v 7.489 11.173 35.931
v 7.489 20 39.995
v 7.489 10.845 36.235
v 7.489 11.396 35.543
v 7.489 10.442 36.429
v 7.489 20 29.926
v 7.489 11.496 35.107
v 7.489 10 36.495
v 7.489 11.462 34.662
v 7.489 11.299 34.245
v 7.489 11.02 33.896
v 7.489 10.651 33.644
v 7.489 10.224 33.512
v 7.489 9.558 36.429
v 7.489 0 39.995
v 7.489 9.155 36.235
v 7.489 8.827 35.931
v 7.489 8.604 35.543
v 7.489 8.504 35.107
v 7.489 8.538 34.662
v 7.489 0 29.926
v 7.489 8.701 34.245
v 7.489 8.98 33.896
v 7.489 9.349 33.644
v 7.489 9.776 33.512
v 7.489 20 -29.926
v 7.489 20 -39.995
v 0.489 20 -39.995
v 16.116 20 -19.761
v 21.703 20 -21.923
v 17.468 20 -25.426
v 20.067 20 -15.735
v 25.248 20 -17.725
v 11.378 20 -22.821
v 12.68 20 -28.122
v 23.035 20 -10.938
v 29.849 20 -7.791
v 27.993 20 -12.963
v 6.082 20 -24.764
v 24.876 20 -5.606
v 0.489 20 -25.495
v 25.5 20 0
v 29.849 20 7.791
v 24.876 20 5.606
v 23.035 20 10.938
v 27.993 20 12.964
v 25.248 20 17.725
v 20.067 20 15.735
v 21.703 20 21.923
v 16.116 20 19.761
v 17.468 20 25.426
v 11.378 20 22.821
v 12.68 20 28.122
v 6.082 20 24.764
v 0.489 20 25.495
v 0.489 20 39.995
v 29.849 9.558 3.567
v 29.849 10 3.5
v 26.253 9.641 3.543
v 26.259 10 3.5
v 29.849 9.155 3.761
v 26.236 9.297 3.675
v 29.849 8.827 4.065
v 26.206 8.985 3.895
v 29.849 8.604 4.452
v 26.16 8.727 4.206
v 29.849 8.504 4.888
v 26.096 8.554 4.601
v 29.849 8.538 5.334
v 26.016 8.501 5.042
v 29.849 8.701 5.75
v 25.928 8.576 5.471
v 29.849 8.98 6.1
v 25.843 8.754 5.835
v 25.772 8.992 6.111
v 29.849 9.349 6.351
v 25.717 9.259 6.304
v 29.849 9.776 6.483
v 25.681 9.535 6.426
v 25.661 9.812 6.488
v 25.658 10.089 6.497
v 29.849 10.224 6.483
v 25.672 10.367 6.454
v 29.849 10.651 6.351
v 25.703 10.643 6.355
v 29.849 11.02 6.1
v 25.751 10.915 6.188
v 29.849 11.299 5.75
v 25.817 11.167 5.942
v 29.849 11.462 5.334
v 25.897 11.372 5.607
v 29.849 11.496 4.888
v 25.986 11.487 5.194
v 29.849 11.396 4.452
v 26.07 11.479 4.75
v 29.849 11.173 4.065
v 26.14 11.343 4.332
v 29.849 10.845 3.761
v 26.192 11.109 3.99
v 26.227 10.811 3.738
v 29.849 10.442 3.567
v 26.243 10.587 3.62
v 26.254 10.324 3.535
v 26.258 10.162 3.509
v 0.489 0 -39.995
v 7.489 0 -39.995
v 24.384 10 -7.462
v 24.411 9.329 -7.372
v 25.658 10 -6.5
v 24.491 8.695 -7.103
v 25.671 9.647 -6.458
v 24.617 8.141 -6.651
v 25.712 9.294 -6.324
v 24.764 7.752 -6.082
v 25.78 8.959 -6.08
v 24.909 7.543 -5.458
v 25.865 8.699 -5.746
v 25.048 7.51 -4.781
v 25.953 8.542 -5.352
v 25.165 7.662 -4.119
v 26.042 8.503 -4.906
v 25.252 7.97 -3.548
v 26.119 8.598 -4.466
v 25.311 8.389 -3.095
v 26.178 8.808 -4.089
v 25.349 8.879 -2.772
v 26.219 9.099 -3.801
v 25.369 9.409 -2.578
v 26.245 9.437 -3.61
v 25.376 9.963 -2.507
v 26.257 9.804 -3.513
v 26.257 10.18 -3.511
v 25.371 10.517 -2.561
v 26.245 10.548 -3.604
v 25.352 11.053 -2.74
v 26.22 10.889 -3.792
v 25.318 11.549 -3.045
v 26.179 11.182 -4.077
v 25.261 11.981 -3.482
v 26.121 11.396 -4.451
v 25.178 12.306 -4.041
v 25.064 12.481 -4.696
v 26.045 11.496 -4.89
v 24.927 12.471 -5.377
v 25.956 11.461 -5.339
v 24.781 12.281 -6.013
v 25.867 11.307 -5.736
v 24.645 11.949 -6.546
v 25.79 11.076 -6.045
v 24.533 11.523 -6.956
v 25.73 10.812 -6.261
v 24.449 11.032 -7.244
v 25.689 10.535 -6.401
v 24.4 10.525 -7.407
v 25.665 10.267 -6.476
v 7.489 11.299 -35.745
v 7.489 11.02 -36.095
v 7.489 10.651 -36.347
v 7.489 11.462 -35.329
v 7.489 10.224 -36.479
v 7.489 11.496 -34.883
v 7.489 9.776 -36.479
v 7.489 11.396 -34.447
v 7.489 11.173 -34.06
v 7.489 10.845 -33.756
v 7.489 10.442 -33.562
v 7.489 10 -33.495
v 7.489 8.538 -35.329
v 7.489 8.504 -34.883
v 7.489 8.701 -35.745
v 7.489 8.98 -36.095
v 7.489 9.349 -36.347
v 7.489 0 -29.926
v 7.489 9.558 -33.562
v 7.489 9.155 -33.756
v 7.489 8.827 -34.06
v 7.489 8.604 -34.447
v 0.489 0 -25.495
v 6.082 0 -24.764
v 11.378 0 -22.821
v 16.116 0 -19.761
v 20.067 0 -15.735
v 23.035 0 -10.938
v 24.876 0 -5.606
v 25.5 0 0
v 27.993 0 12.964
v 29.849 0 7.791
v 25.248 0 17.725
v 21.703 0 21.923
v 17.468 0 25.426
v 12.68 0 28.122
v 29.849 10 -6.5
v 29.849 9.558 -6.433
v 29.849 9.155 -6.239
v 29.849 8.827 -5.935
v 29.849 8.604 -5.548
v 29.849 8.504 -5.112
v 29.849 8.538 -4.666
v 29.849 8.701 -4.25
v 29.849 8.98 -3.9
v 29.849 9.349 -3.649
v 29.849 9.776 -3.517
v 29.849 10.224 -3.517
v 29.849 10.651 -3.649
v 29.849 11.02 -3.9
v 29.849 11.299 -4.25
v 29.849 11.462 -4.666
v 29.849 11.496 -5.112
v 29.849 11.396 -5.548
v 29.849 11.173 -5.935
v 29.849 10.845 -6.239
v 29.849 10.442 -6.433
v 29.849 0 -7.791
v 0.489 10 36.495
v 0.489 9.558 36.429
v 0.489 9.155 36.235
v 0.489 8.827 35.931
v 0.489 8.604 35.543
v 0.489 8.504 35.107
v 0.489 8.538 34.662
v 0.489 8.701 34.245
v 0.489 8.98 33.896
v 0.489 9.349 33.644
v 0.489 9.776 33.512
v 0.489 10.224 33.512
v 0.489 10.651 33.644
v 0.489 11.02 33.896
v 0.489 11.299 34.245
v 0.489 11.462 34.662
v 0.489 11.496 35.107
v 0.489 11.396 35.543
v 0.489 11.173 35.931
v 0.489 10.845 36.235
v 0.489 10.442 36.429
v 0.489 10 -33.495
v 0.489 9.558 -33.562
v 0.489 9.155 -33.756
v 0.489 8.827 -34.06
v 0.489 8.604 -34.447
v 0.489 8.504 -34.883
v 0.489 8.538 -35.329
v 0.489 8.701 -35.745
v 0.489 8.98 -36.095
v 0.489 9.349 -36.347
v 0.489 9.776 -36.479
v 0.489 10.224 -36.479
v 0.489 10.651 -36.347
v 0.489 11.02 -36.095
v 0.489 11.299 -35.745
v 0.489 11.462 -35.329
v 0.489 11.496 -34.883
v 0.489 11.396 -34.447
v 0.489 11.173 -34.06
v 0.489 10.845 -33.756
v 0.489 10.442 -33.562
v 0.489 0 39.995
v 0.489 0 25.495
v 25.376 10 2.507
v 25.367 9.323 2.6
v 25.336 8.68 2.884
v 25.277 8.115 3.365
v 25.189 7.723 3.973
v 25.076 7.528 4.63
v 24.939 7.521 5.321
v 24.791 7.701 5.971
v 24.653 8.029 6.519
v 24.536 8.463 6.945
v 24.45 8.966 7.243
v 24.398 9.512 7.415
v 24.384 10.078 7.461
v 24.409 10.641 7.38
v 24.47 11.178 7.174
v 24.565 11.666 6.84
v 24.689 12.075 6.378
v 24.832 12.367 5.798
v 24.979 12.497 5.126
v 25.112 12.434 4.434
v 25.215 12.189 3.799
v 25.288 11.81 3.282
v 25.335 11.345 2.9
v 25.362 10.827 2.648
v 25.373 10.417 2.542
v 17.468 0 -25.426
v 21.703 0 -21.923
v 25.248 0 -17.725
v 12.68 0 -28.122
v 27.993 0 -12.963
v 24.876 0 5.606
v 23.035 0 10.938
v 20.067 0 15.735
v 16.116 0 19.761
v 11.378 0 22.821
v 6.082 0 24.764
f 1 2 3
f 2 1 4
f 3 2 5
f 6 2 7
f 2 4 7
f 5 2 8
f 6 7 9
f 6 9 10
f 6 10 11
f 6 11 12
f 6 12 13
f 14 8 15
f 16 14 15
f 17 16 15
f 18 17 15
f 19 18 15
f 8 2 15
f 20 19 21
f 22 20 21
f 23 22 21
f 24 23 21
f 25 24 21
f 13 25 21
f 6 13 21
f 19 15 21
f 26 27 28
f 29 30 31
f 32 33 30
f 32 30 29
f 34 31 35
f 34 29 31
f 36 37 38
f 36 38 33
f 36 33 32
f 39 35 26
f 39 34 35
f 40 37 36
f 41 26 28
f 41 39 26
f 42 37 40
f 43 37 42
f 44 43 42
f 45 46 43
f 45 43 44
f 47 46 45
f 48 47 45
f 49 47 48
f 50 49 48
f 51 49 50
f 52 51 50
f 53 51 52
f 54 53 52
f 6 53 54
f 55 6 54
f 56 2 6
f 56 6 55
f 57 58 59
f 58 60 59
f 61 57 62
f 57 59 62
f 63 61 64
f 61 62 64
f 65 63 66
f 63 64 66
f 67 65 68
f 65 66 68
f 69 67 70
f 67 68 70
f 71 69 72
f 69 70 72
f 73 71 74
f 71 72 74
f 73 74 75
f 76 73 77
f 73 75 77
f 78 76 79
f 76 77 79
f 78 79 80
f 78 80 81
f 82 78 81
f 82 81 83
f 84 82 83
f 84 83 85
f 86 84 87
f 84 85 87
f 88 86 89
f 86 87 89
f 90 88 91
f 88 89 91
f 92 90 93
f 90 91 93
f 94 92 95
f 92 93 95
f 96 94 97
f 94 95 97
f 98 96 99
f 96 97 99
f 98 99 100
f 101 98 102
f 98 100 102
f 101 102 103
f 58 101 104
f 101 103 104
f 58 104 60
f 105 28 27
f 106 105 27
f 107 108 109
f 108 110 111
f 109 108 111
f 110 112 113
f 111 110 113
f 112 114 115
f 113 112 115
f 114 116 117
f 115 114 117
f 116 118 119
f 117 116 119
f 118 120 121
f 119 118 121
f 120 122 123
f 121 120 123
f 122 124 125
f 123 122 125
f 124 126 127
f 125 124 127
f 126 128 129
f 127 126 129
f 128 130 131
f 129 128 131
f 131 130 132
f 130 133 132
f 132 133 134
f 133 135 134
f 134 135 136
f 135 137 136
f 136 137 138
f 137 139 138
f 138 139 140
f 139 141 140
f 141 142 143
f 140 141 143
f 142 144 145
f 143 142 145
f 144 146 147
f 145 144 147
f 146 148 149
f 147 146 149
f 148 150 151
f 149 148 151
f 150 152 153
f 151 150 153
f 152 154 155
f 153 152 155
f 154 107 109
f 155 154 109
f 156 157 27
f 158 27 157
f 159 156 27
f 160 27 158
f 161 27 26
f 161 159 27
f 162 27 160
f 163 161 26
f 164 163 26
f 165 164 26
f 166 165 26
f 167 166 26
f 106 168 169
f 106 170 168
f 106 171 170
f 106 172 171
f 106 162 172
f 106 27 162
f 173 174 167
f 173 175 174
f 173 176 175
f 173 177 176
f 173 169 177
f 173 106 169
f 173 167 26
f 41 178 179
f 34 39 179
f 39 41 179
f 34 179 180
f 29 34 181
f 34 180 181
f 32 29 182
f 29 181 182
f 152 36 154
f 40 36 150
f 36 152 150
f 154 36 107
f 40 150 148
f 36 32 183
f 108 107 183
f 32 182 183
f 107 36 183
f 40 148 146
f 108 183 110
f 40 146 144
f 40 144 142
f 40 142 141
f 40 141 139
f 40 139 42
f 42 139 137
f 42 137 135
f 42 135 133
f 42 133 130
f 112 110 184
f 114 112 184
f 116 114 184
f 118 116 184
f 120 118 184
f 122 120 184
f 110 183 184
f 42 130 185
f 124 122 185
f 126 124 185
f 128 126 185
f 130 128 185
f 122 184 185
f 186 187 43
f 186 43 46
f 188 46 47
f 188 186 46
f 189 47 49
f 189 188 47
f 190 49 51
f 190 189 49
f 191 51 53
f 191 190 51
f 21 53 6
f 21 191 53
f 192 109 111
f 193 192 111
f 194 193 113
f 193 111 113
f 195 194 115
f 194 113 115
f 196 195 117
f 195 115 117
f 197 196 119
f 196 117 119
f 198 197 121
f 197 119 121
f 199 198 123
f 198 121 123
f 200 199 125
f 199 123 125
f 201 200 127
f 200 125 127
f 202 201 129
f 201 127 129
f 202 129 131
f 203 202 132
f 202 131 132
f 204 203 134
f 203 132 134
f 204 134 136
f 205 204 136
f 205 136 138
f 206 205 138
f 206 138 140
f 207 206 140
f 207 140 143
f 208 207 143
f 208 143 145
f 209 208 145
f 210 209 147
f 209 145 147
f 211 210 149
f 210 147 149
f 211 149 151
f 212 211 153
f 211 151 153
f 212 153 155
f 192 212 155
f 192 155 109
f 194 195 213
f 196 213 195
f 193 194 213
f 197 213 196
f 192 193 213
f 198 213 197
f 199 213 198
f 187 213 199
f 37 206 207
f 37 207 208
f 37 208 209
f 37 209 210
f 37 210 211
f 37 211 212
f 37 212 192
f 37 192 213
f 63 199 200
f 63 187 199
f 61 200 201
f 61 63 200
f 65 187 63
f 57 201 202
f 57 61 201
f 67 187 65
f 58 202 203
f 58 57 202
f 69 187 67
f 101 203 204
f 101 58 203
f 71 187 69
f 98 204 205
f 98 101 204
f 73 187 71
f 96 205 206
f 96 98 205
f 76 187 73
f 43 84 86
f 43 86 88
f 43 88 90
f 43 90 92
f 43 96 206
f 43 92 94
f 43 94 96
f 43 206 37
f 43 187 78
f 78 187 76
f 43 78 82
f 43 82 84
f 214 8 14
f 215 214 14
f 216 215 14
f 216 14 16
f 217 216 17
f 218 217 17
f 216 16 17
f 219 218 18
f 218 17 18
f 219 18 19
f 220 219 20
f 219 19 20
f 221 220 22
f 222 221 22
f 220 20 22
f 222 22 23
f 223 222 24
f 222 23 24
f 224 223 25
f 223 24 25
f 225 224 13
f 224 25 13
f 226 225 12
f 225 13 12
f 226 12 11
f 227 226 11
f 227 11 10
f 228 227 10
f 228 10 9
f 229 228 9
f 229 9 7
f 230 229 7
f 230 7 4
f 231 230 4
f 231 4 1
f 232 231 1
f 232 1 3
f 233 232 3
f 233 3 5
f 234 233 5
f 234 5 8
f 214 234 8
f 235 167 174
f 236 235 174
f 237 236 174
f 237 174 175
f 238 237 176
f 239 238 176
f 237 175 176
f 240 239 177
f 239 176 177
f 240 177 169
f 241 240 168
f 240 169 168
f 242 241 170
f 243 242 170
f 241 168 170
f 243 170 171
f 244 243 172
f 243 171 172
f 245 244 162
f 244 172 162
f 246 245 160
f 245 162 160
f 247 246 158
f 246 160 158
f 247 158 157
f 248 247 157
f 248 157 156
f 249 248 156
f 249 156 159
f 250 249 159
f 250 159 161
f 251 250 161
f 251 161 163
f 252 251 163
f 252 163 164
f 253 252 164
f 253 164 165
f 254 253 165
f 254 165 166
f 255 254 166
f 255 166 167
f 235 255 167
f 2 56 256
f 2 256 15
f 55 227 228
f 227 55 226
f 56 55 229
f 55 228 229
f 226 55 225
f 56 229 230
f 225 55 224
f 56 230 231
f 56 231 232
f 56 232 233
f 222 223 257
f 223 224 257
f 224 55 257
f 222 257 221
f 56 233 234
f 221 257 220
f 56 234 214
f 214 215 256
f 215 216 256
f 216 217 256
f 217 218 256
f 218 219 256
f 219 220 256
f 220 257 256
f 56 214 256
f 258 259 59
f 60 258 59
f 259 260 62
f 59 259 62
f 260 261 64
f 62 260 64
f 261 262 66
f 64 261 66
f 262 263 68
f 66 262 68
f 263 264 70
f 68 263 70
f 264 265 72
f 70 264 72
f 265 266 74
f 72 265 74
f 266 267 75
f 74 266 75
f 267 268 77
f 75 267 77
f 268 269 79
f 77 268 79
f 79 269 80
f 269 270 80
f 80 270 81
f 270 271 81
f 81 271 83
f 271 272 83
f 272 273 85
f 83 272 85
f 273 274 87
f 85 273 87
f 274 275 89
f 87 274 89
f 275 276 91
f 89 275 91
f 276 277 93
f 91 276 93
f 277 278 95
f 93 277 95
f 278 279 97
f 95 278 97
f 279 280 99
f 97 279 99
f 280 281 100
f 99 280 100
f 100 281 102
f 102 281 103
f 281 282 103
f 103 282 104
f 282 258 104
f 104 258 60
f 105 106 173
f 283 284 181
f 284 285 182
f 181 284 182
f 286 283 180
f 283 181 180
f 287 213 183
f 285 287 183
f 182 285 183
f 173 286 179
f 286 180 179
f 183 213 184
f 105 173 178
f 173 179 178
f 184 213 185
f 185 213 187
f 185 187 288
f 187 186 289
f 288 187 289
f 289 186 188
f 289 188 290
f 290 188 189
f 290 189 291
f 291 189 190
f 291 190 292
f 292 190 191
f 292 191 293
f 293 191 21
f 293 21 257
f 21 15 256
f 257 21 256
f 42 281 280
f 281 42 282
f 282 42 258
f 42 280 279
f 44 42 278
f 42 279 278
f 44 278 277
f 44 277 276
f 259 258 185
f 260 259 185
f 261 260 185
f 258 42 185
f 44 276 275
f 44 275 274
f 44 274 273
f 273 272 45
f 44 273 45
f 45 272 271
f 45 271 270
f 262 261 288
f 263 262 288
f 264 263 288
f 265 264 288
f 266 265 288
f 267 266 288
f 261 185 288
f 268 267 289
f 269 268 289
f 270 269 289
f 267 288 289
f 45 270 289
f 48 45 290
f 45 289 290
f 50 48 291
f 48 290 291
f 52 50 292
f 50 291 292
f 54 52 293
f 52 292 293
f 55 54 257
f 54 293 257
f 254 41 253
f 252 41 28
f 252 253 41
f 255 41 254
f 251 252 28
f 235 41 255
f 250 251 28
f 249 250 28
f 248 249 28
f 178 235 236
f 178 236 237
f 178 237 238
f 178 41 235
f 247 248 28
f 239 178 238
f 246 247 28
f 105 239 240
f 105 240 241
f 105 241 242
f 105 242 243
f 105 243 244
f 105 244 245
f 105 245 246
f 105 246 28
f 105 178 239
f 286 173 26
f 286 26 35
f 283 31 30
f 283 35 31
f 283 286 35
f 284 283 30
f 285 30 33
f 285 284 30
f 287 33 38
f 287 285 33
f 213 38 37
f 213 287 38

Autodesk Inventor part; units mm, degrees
ref_plane "YZ Plane" through (0, 0, 0) normal (1, 0, 0) x (0, 1, 0)
ref_plane "XZ Plane" through (0, 0, 0) normal (0, 1, 0) x (-1, 0, 0)
ref_plane "XY Plane" through (0, 0, 0) normal (0, 0, 1) x (1, 0, 0)
sketch "Skizze1" plane through (0, 0, 0) normal (0, 1, 0) x (-1, 0, 0)
  arc A0 (-0.4888, 25.4953) -> (-25.5, 0) centre (0, 0) ccw
  arc A1 (-7.4888, 29.9259) -> (-30.8486, 0) centre (0, 0) ccw
  line L0 (-0.4888, 25.4953) -> (-0.4888, 39.9953)
  line L1 (-0.4888, 39.9953) -> (-7.4888, 39.9953)
  line L2 (-7.4888, 39.9953) -> (-7.4888, 29.9259)
  line L3 (0, 0) -> (-16.7346, 0) construction
  arc A2 (-25.5, 0) -> (-0.4888, -25.4953) centre (0, 0) ccw
  arc A3 (-30.8486, 0) -> (-7.4888, -29.9259) centre (0, 0) ccw
  line L4 (-0.4888, -25.4953) -> (-0.4888, -39.9953)
  line L5 (-0.4888, -39.9953) -> (-7.4888, -39.9953)
  line L6 (-7.4888, -39.9953) -> (-7.4888, -29.9259)
  dimension "d5" = 14.5
  dimension "d6" = 25.5
  dimension "d8" = 10.0694
  dimension "d9" = 7
  dimension "d52" = 30.8486
extrude "Extrusion1" add sketch "Skizze1" along normal blind 20
sketch "Skizze2" plane through (0.4888, 0, 25.4953) normal (-1, 0, 0) x (0, 0, 1)
  line L0 (14.5, 0) -> (14.5, 20) projected
  line L1 (14.5, 10) -> (-98.2028, 10) construction
  line L2 (0, 20) -> (14.5, 20) projected
  line L3 (-65.4906, 0) -> (-65.4906, 20) projected
  point P0 (-25.4953, 0)
  point P1 (9.5, 10)
  point P2 (-60.4906, 10)
  dimension "d12" = 10
  dimension "d13" = 5
  dimension "d14" = 5
hole "Bohrung1" at (0.4888, 10, 34.9953) at (0.4888, 10, -34.9953) direction (1, 0, 0) diameter 3 end through all
ref_plane "Arbeitsebene1" through (30.8486, 20, 0) normal (1, 0, 0) x (0, 1, 0)
sketch "Skizze3" plane through (30.8486, 20, 0) normal (1, 0, 0) x (0, 1, 0)
  line L0 (0, 25.4953) -> (0, -25.4953) projected
  line L1 (0, 15) -> (-20, 15)
  line L2 (-20, 15) -> (-20, -15)
  line L3 (-20, -15) -> (0, -15)
  line L4 (0, -15) -> (0, 15)
  point P0 (-20, 0)
  dimension "d28" = 20
  dimension "d30" = 15
  dimension "d31" = 15
extrude "Extrusion2" cut sketch "Skizze3" against normal blind 1
sketch "Skizze4" plane through (30.8486, 20, 0) normal (1, 0, 0) x (0, 1, 0)
  line L0 (0, -7.7908) -> (-20, -7.7908) construction
  line L1 (-10, -7.7908) -> (-10, 7.7908) construction
  line L2 (-20, 7.7908) -> (0, 7.7908) construction
  line L3 (-20, 0) -> (0, 0) construction
  line L4 (0, 25.4953) -> (0, -25.4953) construction
  point P0 (-10, -5)
  point P1 (-10, 5)
  dimension "d49" = 5
  dimension "d50" = 5
hole "Bohrung2" at (30.8486, 10, -5) at (30.8486, 10, 5) direction (-1, 0, 0) diameter 3 end through all
chamfer "Fase2" distance 1 angle 45 1 edges at (25.2587, 9.9941, -3.5)
chamfer "Fase3" distance 1 angle 45 1 edges at (24.6577, 9.994, 6.5)
properties part number "spannringe"
